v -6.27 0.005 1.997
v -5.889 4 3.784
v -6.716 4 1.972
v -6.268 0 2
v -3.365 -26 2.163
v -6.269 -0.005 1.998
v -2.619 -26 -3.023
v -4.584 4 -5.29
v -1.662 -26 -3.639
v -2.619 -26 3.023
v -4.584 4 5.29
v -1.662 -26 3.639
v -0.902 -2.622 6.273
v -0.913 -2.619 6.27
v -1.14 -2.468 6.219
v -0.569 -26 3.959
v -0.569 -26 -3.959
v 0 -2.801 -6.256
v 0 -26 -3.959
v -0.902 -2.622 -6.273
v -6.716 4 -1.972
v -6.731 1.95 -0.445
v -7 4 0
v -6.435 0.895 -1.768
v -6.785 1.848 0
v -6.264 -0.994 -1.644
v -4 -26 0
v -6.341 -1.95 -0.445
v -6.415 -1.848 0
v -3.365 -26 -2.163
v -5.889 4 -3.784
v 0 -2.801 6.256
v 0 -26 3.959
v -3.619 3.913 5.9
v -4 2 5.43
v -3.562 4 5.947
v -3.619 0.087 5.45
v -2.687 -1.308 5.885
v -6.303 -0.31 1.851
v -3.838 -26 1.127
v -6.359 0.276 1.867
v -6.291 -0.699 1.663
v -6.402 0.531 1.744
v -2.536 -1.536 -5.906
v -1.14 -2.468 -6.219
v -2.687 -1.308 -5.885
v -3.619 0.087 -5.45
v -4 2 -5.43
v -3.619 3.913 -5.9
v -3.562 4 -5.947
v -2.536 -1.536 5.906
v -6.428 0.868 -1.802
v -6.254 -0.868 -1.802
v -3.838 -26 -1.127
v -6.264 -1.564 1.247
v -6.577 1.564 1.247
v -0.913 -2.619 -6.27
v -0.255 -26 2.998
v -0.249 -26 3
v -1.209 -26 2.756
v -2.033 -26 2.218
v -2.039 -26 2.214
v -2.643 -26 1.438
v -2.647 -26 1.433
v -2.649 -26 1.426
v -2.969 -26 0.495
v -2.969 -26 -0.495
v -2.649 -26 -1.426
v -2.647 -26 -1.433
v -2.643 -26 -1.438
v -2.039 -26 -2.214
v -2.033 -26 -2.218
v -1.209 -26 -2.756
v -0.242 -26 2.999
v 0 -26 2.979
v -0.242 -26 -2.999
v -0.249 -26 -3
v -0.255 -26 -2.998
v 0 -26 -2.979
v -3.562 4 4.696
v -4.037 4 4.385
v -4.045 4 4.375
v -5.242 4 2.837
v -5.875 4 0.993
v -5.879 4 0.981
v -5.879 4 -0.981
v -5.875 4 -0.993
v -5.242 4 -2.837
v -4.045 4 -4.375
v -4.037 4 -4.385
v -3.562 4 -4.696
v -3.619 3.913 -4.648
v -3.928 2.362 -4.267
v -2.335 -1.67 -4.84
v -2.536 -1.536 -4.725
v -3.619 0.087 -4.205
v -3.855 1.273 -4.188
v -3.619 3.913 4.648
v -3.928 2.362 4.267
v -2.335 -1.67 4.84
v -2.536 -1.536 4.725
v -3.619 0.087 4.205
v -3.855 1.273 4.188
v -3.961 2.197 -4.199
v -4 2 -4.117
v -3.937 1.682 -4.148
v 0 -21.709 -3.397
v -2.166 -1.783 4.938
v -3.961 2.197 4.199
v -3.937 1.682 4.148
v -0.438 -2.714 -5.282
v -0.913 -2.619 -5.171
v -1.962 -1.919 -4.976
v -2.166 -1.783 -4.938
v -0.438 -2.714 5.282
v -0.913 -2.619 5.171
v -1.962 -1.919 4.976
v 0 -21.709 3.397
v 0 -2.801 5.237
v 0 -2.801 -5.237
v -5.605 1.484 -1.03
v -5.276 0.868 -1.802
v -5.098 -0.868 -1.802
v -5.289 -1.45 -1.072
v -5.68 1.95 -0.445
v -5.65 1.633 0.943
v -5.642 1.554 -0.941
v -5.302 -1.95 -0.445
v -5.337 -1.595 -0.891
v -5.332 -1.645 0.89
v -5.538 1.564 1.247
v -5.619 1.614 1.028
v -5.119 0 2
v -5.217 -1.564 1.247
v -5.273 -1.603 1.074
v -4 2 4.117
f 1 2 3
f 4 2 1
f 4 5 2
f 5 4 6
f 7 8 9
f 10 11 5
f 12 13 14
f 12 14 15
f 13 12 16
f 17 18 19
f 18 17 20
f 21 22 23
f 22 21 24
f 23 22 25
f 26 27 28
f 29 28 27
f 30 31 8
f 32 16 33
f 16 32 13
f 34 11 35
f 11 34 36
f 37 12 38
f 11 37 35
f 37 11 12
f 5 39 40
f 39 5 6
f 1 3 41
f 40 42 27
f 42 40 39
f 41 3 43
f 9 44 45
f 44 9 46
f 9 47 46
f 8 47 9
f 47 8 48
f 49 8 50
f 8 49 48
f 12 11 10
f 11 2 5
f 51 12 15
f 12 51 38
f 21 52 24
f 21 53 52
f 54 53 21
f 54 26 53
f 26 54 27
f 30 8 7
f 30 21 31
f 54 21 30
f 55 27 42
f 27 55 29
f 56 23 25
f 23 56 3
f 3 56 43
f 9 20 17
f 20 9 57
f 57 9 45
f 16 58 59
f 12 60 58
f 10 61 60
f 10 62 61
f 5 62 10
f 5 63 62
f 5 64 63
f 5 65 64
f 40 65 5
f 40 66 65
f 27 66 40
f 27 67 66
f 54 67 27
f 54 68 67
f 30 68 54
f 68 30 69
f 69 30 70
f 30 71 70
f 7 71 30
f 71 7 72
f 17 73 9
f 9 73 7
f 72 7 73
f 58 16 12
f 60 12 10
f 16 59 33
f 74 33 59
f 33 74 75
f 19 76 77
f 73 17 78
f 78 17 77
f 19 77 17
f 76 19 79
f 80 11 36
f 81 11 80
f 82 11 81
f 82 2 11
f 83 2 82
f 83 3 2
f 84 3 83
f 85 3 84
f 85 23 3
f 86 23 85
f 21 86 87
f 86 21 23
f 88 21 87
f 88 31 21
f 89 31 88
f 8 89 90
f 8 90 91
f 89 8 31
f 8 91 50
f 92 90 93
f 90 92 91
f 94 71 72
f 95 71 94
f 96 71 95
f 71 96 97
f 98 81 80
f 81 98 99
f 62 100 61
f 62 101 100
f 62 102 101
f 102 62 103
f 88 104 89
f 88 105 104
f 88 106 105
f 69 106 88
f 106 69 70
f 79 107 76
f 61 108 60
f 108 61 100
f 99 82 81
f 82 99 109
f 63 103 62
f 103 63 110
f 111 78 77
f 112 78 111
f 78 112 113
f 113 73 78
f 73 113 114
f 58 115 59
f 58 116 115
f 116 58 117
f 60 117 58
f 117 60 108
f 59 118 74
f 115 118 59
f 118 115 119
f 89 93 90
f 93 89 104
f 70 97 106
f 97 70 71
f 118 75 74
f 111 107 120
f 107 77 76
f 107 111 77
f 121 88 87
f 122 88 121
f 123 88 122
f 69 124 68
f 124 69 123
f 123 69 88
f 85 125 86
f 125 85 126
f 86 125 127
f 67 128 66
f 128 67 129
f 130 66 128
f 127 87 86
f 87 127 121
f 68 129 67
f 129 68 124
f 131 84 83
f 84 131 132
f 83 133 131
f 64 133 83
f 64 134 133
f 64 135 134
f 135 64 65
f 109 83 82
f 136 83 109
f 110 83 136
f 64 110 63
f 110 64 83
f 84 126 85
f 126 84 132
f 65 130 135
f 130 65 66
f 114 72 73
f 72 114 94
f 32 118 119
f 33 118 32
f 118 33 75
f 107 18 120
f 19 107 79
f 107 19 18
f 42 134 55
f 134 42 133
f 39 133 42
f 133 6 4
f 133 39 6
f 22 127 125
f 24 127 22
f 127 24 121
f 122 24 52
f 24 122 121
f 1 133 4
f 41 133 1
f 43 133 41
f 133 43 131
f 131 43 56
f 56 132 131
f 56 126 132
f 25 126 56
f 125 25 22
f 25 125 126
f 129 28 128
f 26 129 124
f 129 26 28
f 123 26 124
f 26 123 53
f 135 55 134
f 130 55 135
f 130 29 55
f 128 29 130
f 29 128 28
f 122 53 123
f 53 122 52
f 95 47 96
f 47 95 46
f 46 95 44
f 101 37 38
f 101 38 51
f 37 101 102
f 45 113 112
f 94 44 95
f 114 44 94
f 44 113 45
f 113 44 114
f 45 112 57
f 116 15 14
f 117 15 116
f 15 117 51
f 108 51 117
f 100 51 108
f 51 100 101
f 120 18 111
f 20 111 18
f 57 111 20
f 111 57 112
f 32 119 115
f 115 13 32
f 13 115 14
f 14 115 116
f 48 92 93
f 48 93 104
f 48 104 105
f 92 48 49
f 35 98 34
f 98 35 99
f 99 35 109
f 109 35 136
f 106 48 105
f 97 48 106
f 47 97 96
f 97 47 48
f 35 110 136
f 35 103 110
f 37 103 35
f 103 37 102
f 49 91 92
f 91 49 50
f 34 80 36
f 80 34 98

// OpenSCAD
// [FL_INDEX: keywords="openscad, 3d_parametric, ForeArm, csg_solid" | COT="Parametric OpenSCAD design from 3DCodeverse"]
// Title: ForeArm

//Variables de creacion.
Longitude=30; // [20:30]
rad_wrist=3; // [2:6]
rad_elbow=6; // [4:10]
thick=1; // [0.5:5]
rjoint=2; // [0.5:4]
Rarm=5; // [5:30]

module Shell(L,r_w,r_e,thick,rj){
difference() {
	translate([0,-L+rj+2,0])rotate([-90,0,0]) cylinder(L,r_w+thick,r_e+thick);
	translate([0,-L+rj+1.9,0])rotate([-90,0,0]) cylinder(L+0.5,r_w,r_e);
}}

//Cono hueco;
//Creamos un cono exterior con un grosor añadido y le quitamos el cono interior.
//Shell(Longitude,rad_wrist,rad_elbow,thick);

//Cortamos por la mitad

/*difference(){
	Shell(Longitude,rad_wrist,rad_elbow,thick,rjoint);
	translate([0,-70,-20])cube([50,100,50]);
	translate([10,0,0])rotate([0,-90,0]) cylinder(20,rjoint,rjoint);
	translate([10-rad_wrist-thick,2,-20])cylinder(50,10,10);
}*/

//translate([rad_wrist+thick+2,2,-40])cylinder(80,10,10);

module Shelly(L,r_w,r_e,thick,rj,rspatial){
	difference(){
		Shell(L,r_w,r_e,thick,rj);
		translate([0,-70,-20])cube([50,100,50]);
		translate([10,0,0])rotate([0,-90,0]) cylinder(20,rjoint,rjoint);
		translate([rspatial-rad_wrist-thick,2,-20])cylinder(50,rspatial,rspatial);
	}
}

Shelly(Longitude,rad_wrist,rad_elbow,thick,rjoint,Rarm);
